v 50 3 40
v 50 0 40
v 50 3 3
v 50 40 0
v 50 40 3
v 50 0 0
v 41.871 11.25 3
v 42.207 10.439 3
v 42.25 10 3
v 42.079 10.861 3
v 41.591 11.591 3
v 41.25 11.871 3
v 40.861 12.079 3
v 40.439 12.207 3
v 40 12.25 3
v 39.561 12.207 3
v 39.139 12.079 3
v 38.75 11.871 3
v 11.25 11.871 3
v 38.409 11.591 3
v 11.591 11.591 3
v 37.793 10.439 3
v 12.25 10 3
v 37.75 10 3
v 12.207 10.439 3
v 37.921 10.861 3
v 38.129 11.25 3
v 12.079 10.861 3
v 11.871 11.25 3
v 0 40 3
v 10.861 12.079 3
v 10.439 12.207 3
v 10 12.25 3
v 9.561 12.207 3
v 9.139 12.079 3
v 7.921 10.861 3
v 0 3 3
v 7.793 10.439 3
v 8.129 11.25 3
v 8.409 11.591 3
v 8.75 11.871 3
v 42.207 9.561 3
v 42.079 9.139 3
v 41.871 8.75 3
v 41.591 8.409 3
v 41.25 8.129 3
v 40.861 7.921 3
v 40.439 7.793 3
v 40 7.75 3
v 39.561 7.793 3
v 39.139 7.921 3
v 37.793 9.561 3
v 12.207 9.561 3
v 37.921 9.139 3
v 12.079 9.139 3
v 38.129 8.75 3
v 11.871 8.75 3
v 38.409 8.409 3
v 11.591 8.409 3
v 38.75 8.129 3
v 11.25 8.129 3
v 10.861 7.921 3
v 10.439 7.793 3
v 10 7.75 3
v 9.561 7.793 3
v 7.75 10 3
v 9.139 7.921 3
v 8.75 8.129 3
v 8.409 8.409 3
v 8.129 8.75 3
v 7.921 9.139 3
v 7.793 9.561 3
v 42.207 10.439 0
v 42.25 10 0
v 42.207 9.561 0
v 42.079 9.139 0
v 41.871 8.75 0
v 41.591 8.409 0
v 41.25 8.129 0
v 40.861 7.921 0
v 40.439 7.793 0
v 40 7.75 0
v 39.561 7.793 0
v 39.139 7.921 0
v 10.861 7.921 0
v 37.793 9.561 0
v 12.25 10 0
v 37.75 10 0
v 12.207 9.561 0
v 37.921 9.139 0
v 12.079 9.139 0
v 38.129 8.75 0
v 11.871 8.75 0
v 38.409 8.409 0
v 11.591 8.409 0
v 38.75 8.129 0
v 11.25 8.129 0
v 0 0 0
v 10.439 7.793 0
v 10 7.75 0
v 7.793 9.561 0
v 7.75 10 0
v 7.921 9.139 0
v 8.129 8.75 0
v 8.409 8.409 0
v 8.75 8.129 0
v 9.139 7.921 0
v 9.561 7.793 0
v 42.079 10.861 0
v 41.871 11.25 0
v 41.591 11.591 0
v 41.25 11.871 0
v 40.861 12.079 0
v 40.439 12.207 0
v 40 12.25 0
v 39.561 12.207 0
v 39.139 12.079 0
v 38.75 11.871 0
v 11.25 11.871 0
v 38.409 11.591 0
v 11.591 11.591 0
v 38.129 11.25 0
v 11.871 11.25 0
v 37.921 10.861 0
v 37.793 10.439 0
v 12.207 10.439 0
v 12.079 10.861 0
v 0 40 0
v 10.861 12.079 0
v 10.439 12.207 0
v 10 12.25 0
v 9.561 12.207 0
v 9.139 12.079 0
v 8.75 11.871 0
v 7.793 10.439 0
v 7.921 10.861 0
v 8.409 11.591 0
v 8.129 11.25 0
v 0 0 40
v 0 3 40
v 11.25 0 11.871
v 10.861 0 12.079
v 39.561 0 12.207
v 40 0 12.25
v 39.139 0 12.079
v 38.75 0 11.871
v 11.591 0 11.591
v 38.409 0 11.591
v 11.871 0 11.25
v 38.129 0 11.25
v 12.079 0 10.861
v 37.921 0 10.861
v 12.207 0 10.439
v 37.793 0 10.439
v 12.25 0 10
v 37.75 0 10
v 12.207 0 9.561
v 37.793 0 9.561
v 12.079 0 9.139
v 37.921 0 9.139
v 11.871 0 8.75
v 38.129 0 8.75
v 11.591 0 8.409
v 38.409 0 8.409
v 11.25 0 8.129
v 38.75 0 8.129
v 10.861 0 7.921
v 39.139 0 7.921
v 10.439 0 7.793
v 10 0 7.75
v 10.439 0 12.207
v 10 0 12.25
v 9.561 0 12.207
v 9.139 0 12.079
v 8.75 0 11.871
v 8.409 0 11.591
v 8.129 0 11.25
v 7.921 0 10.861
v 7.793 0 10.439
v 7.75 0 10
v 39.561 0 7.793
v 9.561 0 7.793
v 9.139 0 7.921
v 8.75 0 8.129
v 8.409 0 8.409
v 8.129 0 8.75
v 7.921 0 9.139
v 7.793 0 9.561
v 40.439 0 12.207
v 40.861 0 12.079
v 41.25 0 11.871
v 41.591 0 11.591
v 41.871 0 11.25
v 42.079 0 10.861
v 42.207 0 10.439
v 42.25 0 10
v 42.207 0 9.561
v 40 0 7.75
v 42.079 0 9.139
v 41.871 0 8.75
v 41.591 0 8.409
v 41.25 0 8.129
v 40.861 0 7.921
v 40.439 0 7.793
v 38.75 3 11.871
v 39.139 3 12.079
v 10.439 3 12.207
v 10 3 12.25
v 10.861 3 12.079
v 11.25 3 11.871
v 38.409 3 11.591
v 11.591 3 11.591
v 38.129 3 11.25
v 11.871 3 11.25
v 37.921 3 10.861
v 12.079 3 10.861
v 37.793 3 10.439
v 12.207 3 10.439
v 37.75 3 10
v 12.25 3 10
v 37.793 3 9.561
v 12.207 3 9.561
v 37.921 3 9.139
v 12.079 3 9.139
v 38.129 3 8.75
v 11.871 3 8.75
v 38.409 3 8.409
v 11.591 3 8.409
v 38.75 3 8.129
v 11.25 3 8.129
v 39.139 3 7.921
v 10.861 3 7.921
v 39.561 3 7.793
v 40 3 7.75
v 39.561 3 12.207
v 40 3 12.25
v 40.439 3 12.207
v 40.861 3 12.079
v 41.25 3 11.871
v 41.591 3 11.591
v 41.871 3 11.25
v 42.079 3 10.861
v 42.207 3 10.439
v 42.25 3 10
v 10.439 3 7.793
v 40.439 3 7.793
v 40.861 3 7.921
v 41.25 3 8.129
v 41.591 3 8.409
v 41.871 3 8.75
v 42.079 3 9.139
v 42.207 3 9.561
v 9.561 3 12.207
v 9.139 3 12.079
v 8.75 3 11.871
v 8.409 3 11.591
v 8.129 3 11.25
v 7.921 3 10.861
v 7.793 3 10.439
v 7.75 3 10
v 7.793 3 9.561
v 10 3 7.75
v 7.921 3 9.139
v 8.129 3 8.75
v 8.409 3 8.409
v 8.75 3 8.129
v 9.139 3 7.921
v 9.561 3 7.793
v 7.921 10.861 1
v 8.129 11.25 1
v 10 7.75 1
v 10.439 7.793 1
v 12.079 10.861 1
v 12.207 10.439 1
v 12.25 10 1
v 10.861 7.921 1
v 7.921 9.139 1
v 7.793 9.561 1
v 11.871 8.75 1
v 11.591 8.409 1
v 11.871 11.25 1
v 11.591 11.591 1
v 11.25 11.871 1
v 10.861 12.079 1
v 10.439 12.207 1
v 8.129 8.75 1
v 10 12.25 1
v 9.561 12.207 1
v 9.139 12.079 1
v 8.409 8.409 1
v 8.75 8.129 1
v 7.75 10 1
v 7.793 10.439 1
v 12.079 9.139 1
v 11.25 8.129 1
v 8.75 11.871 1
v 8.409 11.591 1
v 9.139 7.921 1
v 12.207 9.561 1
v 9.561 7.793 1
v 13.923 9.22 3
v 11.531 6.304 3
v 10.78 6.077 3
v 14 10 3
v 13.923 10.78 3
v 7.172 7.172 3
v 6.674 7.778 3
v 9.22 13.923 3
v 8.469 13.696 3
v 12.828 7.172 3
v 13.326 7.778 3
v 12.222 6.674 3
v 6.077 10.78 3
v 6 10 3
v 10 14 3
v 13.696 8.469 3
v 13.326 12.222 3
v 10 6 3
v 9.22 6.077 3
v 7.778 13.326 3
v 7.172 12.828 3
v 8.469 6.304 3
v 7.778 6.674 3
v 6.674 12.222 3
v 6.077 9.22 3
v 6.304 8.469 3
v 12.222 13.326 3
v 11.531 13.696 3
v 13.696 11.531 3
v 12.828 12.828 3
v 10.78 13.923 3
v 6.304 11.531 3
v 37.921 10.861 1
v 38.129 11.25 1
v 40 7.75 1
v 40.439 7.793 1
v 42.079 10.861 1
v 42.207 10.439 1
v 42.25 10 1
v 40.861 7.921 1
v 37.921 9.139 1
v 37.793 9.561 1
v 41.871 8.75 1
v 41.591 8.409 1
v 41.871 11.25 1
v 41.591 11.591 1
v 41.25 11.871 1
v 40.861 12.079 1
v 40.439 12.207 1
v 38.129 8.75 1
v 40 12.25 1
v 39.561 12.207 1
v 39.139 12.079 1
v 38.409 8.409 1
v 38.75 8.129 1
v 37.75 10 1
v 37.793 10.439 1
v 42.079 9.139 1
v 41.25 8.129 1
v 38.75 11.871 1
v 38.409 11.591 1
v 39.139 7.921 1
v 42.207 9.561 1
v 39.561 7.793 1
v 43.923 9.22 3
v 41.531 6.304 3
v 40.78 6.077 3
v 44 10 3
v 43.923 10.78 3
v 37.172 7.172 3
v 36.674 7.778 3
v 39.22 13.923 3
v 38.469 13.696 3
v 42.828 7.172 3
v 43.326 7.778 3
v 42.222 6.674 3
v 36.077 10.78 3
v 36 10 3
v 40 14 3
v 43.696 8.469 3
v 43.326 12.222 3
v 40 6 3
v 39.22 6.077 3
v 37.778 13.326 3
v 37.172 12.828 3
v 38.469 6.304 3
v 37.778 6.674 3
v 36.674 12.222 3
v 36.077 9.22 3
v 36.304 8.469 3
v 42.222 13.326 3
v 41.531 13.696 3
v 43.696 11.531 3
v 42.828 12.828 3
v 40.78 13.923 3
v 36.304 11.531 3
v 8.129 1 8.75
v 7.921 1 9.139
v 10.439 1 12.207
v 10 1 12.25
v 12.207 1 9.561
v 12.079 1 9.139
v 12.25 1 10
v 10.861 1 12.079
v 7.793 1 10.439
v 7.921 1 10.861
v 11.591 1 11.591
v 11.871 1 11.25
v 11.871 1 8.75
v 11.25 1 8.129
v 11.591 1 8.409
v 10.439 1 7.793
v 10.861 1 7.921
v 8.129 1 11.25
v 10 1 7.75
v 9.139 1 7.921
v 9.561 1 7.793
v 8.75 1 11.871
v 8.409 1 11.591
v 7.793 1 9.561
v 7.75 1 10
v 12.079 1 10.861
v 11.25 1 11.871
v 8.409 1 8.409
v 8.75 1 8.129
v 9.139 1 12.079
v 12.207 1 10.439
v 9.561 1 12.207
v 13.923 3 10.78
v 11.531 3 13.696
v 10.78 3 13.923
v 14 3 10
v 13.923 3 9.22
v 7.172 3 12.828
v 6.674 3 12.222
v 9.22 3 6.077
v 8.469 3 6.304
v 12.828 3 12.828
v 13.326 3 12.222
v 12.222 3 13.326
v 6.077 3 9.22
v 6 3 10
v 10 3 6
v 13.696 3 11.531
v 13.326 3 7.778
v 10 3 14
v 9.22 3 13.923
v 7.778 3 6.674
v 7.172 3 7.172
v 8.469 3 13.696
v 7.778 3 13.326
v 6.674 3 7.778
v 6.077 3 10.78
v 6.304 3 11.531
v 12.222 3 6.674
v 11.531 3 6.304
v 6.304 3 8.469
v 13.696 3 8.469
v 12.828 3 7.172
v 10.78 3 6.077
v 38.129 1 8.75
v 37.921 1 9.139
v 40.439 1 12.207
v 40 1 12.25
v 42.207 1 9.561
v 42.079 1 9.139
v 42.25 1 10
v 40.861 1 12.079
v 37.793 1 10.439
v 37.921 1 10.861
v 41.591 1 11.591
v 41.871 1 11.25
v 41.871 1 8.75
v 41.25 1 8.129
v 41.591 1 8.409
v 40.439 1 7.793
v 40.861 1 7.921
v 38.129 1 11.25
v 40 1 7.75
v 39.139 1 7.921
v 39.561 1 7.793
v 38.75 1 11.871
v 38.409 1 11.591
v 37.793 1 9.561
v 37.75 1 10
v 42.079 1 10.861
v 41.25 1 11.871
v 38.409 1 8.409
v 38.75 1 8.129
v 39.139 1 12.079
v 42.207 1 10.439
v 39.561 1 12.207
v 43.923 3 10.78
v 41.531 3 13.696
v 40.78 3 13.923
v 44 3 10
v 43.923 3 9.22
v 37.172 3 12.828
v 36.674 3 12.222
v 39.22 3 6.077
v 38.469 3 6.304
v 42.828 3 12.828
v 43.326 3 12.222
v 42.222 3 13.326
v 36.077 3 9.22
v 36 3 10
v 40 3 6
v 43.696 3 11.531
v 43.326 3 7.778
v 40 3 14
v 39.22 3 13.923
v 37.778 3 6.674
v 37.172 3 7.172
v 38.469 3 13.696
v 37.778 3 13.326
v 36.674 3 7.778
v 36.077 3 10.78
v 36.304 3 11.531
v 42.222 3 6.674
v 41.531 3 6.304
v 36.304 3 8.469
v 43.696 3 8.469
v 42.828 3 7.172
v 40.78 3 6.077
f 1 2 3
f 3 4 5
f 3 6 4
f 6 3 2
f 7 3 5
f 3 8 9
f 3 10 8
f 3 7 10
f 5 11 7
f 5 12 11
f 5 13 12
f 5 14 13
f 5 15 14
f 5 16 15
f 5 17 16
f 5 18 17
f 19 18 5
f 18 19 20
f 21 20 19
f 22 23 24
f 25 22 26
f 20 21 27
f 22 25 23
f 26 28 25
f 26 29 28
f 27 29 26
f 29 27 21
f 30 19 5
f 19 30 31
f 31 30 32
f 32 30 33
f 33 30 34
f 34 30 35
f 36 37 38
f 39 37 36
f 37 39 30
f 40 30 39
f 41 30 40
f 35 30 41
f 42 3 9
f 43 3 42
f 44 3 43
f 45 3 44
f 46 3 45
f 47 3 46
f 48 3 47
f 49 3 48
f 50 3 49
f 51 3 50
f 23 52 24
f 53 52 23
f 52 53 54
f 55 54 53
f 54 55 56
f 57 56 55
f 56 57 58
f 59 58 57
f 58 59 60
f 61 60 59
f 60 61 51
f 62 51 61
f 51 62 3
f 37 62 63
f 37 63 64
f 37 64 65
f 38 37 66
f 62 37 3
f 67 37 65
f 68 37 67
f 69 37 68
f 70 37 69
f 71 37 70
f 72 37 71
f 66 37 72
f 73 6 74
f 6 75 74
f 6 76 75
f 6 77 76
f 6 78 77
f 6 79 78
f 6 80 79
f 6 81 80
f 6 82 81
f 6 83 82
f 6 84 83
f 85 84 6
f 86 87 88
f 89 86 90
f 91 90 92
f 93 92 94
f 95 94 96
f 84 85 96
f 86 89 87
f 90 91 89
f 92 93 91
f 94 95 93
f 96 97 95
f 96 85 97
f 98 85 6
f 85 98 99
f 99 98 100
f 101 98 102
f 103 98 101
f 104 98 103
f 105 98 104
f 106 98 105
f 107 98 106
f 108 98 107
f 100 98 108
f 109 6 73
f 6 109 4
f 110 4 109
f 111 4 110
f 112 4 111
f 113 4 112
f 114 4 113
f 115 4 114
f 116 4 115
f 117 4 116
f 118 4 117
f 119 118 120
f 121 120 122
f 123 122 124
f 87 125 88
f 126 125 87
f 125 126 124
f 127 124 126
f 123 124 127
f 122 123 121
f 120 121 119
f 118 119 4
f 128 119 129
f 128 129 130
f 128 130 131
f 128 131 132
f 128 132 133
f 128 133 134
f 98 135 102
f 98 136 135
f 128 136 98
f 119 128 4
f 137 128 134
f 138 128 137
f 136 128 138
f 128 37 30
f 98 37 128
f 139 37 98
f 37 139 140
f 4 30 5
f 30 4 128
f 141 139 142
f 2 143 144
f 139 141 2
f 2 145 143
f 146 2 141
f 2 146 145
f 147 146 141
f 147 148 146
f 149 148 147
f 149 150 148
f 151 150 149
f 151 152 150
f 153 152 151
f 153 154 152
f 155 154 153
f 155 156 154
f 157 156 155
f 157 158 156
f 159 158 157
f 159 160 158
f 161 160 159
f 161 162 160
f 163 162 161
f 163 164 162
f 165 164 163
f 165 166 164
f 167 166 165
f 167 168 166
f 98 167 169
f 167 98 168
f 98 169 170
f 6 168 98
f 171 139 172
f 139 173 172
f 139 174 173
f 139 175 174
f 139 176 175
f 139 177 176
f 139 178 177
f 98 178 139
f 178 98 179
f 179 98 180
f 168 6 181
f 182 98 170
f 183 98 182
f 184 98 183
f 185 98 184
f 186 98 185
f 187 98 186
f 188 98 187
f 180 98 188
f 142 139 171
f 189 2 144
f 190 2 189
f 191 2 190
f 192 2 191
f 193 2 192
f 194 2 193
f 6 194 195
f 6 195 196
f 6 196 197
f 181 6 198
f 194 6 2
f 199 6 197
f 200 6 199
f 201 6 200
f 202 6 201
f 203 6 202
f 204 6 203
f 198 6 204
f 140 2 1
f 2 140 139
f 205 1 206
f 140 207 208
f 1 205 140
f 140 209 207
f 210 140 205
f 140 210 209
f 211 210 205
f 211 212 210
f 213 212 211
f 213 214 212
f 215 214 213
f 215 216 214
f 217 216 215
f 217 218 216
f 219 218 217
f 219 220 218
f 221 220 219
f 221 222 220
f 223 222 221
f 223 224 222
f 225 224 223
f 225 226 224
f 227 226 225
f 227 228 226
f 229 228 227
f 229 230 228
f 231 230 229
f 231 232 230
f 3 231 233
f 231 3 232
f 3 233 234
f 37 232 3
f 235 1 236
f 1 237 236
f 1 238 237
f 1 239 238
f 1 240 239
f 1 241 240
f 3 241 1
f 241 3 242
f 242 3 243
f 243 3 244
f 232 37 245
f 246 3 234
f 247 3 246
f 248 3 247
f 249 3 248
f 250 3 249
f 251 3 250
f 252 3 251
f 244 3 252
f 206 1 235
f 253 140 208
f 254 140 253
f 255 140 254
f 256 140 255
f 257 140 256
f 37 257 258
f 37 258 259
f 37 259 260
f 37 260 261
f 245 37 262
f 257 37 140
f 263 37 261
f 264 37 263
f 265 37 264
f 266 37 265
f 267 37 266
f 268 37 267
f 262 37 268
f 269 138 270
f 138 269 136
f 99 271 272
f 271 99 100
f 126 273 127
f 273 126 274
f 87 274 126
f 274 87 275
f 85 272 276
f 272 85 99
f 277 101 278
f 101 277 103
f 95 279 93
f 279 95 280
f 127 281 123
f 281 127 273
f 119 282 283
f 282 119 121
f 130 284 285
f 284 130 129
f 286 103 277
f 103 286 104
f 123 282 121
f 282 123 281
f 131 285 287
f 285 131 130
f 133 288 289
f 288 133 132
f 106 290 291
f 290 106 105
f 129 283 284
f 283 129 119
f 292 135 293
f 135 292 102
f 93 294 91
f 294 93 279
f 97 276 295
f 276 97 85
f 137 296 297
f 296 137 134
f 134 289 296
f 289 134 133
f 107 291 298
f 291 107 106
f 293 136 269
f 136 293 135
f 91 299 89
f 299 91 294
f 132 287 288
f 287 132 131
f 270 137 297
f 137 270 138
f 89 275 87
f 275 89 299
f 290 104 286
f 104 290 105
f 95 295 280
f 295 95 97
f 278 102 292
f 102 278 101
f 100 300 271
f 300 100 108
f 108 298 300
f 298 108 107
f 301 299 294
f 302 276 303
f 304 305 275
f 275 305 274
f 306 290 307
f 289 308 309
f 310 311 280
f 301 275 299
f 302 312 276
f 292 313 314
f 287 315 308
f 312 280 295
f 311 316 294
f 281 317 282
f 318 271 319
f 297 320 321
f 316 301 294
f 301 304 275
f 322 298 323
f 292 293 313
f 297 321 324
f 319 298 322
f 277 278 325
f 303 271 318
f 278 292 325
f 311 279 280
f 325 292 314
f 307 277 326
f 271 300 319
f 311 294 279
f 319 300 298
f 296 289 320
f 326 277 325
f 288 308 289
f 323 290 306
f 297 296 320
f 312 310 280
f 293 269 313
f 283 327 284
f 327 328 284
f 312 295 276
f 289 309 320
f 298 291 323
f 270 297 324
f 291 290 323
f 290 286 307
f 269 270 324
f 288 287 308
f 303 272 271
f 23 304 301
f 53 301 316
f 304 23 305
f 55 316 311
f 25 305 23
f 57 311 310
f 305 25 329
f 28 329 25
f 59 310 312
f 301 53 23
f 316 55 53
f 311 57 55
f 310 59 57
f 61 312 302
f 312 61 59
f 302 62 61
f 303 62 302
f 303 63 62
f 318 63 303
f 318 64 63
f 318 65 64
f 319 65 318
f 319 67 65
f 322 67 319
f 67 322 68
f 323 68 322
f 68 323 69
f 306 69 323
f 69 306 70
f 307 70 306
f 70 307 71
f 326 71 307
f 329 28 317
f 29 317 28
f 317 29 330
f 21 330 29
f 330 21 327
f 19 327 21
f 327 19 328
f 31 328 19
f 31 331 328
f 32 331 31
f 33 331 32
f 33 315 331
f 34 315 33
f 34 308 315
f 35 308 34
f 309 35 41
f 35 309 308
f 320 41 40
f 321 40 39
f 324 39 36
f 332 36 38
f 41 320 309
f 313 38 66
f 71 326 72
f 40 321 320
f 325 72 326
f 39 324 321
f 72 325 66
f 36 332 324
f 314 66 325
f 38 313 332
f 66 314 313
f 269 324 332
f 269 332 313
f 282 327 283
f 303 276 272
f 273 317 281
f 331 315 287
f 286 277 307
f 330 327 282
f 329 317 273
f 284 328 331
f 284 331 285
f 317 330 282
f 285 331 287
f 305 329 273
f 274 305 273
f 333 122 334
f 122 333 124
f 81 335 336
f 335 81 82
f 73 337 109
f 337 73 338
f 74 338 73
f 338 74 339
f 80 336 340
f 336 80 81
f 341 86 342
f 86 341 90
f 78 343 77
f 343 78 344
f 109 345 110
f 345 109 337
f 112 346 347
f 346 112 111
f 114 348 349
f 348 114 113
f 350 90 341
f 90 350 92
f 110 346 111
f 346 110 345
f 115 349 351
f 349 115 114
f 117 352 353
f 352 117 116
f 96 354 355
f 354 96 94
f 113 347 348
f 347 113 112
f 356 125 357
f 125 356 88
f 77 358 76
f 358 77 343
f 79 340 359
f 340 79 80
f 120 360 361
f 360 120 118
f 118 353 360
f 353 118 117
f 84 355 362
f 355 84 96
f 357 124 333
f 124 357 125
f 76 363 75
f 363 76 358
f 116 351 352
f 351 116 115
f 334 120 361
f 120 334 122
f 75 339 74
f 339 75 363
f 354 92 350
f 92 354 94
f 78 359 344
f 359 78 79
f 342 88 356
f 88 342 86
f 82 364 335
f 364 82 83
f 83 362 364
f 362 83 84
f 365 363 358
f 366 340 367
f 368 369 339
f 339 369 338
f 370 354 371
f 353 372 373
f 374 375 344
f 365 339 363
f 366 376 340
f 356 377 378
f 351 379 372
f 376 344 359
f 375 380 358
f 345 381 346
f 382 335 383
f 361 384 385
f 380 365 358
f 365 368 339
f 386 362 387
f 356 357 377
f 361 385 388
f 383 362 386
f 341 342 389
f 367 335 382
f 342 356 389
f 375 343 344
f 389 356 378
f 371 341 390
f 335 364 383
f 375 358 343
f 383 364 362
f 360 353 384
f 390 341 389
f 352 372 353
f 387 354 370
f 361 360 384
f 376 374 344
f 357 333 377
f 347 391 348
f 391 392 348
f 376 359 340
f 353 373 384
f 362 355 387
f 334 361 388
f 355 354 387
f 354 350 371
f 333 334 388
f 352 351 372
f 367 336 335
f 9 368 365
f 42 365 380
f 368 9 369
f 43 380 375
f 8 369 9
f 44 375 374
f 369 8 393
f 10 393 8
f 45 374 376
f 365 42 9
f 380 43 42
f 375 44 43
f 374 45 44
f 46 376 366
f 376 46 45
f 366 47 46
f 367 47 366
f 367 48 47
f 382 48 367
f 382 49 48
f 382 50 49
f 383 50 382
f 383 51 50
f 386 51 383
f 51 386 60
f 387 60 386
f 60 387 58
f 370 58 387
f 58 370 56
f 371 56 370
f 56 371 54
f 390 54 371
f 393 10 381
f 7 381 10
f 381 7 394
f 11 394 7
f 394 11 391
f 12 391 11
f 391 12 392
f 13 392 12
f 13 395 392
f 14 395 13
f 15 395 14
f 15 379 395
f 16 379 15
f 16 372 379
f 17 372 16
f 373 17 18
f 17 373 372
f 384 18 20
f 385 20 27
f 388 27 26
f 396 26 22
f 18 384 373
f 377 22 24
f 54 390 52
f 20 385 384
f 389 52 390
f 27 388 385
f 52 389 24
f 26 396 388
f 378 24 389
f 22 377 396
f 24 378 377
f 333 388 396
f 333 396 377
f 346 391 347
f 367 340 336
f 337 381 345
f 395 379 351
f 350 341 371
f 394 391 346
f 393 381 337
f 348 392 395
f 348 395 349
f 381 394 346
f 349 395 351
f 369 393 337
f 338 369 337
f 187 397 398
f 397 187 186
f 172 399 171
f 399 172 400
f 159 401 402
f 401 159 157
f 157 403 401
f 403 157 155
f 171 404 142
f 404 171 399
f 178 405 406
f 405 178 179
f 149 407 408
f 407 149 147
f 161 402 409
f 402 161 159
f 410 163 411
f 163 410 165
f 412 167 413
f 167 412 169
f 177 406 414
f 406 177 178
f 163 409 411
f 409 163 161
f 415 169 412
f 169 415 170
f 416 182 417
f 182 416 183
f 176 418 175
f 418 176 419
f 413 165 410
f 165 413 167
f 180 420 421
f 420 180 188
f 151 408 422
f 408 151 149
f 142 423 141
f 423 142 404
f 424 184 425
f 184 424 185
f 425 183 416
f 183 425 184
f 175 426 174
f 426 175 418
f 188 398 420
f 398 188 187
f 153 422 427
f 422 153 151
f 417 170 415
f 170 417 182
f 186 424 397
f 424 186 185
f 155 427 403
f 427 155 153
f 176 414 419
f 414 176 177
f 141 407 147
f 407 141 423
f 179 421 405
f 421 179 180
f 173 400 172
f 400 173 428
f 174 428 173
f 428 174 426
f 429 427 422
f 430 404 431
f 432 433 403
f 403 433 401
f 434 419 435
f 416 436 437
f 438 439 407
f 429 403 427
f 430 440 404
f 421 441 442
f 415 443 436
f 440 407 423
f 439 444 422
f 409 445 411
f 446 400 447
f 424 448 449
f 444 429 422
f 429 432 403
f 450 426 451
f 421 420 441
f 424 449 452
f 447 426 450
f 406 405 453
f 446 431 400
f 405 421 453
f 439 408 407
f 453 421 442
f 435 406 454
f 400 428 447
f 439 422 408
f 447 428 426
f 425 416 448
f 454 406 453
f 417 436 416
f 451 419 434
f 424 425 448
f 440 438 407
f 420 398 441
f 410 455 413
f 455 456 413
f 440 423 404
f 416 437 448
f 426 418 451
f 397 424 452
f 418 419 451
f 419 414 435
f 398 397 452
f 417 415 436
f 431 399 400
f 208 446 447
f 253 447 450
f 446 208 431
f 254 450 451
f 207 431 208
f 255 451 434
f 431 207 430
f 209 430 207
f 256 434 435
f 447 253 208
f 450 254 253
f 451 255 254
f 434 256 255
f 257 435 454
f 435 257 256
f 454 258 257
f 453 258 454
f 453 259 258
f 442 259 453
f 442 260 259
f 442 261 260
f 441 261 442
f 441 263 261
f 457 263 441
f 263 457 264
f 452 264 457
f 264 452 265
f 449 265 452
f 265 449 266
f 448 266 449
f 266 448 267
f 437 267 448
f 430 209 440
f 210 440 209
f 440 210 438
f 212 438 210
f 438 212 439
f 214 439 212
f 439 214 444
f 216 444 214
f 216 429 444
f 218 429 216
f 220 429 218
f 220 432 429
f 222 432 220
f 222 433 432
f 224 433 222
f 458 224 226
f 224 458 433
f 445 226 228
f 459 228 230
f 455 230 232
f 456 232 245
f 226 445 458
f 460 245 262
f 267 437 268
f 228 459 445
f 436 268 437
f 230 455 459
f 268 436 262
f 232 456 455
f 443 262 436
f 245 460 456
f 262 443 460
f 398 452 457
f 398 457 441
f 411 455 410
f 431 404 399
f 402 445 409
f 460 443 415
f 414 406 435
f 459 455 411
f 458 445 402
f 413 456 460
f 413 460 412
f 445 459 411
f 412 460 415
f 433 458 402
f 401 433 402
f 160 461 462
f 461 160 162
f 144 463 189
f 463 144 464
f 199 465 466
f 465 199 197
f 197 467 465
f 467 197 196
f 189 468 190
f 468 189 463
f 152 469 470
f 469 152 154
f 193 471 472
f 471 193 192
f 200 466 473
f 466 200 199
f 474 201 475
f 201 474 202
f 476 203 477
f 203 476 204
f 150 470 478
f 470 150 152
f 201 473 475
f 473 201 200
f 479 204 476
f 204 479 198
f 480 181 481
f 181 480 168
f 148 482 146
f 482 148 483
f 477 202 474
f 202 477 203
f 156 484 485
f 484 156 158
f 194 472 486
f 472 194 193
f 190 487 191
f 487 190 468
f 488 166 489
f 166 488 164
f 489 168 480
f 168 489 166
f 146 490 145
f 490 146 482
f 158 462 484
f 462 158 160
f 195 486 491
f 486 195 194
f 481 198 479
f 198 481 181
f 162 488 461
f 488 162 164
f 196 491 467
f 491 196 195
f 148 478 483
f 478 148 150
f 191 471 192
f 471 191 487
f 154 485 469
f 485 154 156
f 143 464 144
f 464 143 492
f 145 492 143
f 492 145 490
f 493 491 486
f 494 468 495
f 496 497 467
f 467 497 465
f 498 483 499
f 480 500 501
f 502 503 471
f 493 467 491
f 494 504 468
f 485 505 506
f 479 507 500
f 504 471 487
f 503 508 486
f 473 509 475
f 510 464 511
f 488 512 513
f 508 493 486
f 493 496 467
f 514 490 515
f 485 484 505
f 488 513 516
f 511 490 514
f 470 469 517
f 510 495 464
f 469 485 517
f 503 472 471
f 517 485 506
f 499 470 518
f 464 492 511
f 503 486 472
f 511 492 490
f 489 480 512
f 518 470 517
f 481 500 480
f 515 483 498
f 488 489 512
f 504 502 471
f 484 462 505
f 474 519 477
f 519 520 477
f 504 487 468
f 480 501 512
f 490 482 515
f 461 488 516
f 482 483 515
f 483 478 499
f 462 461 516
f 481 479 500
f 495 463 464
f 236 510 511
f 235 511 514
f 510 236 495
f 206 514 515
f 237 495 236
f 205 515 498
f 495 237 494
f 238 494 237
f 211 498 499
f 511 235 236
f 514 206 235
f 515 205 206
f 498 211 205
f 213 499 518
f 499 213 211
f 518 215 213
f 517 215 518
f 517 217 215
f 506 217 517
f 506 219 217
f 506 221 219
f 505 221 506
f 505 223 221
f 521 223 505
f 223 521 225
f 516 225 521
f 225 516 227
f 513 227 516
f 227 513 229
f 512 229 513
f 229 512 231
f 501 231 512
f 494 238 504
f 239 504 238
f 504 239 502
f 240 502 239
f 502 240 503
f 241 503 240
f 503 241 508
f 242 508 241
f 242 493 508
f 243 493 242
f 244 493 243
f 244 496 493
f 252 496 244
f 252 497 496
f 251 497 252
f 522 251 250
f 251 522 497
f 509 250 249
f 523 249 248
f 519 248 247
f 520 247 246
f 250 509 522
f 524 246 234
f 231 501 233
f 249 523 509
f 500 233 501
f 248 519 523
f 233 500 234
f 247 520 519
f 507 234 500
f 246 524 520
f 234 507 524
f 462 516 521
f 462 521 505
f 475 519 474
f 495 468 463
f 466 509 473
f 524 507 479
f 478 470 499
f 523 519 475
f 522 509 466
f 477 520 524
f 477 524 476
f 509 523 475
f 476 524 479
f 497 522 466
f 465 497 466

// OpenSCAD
// パラメータ設定
width = 50;
h_depth = 40;
v_height = 40;
thickness = 3;

hole_dia = 4.5;
countersink_dia = 8;
countersink_depth = 2;

// 皿穴モジュール
module countersunk_hole() {
    union() {
        cylinder(d = hole_dia, h = thickness + 0.1, $fn = 32);
        translate([0, 0, thickness - countersink_depth + 0.05])
            cylinder(d1 = hole_dia, d2 = countersink_dia, h = countersink_depth, $fn = 32);
    }
}

// L字金具本体
difference() {
    union() {
        // 水平面
        cube([width, h_depth, thickness]);
        // 垂直面
        cube([width, thickness, v_height]);
    }

    // 水平面の穴 (Y方向に10mm内側、X方向に左右対称)
    for (x = [-1, 1]) {
        translate([width / 2 + x * 15, 10, -0.05])
            rotate([0, 0, 0])
                countersunk_hole();
    }

    // 垂直面の穴 (Z方向に10mm内側、X方向に左右対称)
    for (x = [-1, 1]) {
        translate([width / 2 + x * 15, -0.05, 10])
            rotate([-90, 0, 0])
                countersunk_hole();
    }
}
